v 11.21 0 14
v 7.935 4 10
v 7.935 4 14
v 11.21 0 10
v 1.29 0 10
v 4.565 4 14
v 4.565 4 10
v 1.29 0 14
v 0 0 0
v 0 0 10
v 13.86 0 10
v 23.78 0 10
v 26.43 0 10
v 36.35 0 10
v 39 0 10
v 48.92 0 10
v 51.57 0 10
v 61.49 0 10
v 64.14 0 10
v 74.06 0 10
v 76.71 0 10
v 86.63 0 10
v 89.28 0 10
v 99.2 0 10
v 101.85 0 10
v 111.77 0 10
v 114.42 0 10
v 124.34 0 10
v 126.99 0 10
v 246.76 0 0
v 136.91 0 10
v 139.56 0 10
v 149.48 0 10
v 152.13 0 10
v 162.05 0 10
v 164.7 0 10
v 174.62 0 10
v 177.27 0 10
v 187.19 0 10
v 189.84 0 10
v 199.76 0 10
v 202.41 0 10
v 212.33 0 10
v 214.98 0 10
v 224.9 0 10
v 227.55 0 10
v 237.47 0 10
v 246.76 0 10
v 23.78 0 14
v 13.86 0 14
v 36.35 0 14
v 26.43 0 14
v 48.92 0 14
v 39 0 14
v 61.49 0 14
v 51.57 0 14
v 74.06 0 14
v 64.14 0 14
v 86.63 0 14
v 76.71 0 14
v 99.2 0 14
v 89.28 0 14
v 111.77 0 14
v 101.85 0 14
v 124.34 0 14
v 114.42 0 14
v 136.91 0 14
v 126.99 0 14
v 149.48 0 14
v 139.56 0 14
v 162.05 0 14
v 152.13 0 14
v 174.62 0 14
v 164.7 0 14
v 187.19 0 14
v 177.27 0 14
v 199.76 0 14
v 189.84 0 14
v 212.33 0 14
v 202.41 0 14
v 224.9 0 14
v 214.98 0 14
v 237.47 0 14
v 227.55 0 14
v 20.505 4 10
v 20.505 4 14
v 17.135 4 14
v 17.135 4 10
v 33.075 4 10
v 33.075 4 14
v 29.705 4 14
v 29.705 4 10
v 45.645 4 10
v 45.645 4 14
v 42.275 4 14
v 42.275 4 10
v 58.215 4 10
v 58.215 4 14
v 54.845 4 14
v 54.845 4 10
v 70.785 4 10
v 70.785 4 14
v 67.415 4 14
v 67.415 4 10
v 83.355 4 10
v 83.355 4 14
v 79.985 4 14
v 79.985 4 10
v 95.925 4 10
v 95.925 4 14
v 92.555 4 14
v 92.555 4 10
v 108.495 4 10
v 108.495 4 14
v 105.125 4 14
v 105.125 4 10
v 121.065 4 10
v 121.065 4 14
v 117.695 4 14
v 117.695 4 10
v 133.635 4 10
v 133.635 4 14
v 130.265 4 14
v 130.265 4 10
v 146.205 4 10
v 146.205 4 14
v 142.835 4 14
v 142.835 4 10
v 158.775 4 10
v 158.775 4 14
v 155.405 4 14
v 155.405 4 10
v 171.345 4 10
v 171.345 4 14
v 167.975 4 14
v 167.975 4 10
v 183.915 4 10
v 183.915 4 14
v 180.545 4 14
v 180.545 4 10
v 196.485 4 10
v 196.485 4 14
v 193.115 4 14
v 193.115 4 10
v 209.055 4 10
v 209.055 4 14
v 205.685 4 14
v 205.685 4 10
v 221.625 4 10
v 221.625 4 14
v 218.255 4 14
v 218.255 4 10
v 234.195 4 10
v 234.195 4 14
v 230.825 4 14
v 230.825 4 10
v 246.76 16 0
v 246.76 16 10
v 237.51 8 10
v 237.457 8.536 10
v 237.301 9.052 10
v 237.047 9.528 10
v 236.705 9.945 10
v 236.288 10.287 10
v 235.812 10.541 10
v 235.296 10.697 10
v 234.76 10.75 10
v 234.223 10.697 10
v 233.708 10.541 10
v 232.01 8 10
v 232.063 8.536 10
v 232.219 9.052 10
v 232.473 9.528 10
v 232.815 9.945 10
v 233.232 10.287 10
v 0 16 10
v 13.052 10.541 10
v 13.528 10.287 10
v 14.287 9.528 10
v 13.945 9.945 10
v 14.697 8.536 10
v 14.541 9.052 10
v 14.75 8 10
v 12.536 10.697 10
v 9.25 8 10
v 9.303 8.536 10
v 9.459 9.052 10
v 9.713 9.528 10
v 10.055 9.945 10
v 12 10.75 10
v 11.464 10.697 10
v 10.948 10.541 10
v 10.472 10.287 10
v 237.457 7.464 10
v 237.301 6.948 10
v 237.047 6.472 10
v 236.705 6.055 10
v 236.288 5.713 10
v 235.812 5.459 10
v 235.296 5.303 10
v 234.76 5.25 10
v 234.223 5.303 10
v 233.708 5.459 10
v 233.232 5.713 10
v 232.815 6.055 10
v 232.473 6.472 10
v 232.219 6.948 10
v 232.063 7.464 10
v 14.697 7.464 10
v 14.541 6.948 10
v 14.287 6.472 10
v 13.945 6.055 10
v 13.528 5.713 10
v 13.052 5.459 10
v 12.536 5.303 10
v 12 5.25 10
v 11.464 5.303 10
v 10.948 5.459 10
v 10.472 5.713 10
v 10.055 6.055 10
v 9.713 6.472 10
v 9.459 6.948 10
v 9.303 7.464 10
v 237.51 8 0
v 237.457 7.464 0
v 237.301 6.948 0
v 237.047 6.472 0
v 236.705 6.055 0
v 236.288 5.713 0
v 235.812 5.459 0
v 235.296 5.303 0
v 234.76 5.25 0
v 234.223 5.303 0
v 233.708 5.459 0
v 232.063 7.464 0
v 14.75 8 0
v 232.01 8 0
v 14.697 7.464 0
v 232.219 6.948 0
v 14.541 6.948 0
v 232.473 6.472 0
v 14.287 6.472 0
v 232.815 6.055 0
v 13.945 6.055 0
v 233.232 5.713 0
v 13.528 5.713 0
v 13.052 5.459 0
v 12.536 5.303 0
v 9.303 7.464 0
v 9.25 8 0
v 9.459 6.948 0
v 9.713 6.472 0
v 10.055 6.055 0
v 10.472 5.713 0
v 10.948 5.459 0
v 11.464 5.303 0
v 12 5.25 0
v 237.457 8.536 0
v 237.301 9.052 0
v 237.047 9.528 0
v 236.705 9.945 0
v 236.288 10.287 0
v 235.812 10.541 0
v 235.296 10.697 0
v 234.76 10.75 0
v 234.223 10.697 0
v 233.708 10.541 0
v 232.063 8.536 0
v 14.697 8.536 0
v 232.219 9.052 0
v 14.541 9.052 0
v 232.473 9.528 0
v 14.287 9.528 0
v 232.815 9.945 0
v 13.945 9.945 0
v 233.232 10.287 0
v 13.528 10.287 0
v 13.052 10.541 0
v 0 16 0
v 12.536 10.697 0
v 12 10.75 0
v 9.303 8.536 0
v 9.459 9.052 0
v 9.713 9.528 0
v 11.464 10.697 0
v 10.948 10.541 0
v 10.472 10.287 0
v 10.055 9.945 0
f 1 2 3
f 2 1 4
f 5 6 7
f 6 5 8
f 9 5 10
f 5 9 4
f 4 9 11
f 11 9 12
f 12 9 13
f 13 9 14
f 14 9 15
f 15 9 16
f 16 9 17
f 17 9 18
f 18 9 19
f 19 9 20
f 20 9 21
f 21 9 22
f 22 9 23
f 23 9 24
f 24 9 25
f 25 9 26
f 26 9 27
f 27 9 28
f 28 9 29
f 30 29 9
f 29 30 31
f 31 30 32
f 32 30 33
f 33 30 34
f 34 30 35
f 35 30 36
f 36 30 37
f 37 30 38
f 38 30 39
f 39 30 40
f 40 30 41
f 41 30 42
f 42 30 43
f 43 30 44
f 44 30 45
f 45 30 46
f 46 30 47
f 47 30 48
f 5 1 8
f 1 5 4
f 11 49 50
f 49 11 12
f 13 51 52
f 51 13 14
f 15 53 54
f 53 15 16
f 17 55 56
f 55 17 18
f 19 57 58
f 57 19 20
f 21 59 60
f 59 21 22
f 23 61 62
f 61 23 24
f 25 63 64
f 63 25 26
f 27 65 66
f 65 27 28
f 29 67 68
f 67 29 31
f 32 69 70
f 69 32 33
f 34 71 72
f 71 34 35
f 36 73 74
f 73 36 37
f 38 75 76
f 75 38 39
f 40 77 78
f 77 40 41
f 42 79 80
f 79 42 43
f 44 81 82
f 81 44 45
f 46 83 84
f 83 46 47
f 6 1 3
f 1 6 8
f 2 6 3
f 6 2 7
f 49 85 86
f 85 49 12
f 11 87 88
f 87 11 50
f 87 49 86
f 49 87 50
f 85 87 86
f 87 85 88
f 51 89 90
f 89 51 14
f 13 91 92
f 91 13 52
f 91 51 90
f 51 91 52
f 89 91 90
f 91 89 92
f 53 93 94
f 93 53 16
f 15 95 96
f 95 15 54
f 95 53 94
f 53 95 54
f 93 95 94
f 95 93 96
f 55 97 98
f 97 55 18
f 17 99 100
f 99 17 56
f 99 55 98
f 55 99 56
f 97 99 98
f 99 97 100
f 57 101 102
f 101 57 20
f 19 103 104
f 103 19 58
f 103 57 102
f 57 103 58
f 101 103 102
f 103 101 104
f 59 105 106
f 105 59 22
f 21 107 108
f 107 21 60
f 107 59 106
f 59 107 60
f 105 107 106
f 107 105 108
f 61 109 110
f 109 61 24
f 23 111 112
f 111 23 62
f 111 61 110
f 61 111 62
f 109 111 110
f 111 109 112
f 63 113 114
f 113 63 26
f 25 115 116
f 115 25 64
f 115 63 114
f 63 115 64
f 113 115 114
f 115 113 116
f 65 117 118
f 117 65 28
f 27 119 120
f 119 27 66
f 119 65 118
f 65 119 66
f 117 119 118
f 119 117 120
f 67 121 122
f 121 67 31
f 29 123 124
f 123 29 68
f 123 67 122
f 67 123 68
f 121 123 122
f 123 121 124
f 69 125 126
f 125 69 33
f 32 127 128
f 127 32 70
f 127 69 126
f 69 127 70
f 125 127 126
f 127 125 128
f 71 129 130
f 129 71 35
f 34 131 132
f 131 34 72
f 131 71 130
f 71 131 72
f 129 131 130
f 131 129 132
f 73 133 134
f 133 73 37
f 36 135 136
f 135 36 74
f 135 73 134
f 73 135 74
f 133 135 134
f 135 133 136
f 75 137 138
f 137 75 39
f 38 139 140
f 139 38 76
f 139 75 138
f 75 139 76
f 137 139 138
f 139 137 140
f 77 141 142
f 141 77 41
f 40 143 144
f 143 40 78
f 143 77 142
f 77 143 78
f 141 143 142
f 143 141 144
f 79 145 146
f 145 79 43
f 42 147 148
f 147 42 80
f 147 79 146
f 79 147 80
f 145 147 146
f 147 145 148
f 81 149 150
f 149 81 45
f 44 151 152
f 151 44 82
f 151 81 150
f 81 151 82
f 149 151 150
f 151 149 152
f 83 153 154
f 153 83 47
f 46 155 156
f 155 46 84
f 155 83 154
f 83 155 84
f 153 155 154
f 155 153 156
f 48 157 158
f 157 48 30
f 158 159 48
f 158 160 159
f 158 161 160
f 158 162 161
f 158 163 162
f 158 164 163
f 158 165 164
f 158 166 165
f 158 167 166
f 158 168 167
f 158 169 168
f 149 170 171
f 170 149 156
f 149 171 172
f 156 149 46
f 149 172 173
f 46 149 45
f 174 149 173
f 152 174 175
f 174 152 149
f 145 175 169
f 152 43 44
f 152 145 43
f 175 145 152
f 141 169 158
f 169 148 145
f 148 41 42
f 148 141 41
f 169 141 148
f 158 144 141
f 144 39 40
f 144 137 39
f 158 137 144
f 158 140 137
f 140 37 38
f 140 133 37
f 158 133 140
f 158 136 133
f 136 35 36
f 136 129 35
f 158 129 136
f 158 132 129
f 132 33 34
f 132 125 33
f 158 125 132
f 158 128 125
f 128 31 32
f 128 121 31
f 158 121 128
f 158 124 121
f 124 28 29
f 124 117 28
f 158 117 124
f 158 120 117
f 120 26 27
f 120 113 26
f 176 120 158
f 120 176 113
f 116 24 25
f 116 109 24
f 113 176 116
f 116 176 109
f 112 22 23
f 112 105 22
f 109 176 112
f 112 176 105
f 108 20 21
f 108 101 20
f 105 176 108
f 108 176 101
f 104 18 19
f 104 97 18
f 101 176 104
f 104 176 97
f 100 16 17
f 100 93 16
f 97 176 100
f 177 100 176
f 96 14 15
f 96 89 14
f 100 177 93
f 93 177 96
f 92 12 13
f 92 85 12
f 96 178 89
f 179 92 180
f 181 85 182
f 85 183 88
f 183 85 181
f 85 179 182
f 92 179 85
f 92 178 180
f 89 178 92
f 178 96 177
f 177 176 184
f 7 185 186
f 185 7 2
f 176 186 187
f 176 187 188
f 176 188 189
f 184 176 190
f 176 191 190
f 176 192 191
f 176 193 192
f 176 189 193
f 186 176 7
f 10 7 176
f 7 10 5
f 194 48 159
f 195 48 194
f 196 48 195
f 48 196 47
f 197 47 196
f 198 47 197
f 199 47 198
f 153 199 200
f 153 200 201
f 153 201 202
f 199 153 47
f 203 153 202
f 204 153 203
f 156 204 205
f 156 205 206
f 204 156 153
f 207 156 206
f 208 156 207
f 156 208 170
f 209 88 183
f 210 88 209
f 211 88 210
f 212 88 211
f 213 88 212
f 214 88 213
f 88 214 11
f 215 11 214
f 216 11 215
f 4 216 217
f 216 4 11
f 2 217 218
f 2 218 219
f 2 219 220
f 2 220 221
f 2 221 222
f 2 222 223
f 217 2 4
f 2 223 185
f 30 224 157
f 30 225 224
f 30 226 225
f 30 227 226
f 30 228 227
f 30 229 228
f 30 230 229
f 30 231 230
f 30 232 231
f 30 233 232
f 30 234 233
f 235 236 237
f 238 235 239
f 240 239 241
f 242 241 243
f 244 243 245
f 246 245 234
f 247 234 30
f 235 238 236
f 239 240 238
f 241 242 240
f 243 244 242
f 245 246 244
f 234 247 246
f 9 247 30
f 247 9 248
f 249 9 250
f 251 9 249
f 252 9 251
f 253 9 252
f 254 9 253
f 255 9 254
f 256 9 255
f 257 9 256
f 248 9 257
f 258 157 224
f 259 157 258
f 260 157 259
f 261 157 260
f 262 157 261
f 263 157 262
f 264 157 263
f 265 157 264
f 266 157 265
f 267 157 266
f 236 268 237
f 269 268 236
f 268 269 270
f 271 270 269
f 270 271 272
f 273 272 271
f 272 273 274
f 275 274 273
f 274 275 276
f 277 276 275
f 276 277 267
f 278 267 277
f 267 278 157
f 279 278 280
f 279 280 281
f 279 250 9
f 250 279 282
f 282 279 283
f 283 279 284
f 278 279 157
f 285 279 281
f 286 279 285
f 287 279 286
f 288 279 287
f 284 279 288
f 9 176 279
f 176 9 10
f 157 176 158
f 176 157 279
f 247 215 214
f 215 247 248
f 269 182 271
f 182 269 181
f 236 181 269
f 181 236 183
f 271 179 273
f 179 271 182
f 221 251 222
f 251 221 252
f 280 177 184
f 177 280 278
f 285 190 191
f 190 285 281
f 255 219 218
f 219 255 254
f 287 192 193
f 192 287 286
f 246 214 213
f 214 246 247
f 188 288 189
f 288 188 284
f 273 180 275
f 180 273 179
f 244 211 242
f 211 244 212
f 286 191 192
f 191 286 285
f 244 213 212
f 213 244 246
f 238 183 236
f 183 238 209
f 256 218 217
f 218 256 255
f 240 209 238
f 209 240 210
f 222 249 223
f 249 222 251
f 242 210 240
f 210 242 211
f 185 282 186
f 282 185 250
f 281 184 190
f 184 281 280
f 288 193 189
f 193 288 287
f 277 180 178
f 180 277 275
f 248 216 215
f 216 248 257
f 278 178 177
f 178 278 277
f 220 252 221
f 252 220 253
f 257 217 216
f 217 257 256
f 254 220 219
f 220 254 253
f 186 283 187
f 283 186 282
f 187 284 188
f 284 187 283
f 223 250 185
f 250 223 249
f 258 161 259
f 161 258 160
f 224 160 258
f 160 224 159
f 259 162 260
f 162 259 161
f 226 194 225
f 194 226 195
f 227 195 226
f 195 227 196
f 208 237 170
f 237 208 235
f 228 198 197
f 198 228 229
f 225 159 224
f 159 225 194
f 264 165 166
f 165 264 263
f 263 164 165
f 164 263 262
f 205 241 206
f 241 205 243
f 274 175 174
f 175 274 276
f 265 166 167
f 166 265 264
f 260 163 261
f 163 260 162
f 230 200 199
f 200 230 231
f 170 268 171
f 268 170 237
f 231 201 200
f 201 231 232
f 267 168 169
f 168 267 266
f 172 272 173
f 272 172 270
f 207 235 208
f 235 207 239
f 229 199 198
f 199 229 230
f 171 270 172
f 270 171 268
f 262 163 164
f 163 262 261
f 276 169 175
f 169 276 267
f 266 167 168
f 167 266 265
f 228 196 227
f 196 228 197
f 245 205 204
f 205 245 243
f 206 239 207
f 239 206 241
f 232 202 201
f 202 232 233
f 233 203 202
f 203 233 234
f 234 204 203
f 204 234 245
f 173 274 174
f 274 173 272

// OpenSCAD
$fn = 32;

// ----------------------------------------------------------------------
// Gear rack: m=4 z=19, 246.76 x 16 x 14 mm
// ----------------------------------------------------------------------

// --- parameters (mm) ---
rack_len = 246.76;        // rack length, X
rack_w = 16;              // rack width, Y
rack_h = 14;              // overall height, Z
modul = 4;                // module
body_t = 10;              // tooth root line height
pitch = 12.57;            // circular pitch
tip_w = 3.37;             // tooth thickness at the tip
root_w = 9.92;            // tooth thickness at the root line
hole_d = 5.5;             // mounting hole
sink = 0.6;               // tooth root overlap into the body

tooth_span = 238.76;

module tooth(x0) {
  /* 20 deg flank profile, sunk into the body for a positive overlap */
  translate([x0, 0, body_t - sink])
    linear_extrude(height = rack_h - body_t + sink)
      polygon(points = [[-root_w / 2, 0], [root_w / 2, 0],
                        [tip_w / 2, rack_h - body_t],
                        [-tip_w / 2, rack_h - body_t]]);
}

difference() {
  union() {
    cube([rack_len, rack_w, body_t]);
    for (i = [0 : 19 - 1])
      tooth((i + 0.5) * pitch + (tooth_span - 19 * pitch) / 2);
  }
  translate([12, 8, -1]) cylinder(h = body_t + 2, d = hole_d);
  translate([234.76, 8, -1]) cylinder(h = body_t + 2, d = hole_d);
}
